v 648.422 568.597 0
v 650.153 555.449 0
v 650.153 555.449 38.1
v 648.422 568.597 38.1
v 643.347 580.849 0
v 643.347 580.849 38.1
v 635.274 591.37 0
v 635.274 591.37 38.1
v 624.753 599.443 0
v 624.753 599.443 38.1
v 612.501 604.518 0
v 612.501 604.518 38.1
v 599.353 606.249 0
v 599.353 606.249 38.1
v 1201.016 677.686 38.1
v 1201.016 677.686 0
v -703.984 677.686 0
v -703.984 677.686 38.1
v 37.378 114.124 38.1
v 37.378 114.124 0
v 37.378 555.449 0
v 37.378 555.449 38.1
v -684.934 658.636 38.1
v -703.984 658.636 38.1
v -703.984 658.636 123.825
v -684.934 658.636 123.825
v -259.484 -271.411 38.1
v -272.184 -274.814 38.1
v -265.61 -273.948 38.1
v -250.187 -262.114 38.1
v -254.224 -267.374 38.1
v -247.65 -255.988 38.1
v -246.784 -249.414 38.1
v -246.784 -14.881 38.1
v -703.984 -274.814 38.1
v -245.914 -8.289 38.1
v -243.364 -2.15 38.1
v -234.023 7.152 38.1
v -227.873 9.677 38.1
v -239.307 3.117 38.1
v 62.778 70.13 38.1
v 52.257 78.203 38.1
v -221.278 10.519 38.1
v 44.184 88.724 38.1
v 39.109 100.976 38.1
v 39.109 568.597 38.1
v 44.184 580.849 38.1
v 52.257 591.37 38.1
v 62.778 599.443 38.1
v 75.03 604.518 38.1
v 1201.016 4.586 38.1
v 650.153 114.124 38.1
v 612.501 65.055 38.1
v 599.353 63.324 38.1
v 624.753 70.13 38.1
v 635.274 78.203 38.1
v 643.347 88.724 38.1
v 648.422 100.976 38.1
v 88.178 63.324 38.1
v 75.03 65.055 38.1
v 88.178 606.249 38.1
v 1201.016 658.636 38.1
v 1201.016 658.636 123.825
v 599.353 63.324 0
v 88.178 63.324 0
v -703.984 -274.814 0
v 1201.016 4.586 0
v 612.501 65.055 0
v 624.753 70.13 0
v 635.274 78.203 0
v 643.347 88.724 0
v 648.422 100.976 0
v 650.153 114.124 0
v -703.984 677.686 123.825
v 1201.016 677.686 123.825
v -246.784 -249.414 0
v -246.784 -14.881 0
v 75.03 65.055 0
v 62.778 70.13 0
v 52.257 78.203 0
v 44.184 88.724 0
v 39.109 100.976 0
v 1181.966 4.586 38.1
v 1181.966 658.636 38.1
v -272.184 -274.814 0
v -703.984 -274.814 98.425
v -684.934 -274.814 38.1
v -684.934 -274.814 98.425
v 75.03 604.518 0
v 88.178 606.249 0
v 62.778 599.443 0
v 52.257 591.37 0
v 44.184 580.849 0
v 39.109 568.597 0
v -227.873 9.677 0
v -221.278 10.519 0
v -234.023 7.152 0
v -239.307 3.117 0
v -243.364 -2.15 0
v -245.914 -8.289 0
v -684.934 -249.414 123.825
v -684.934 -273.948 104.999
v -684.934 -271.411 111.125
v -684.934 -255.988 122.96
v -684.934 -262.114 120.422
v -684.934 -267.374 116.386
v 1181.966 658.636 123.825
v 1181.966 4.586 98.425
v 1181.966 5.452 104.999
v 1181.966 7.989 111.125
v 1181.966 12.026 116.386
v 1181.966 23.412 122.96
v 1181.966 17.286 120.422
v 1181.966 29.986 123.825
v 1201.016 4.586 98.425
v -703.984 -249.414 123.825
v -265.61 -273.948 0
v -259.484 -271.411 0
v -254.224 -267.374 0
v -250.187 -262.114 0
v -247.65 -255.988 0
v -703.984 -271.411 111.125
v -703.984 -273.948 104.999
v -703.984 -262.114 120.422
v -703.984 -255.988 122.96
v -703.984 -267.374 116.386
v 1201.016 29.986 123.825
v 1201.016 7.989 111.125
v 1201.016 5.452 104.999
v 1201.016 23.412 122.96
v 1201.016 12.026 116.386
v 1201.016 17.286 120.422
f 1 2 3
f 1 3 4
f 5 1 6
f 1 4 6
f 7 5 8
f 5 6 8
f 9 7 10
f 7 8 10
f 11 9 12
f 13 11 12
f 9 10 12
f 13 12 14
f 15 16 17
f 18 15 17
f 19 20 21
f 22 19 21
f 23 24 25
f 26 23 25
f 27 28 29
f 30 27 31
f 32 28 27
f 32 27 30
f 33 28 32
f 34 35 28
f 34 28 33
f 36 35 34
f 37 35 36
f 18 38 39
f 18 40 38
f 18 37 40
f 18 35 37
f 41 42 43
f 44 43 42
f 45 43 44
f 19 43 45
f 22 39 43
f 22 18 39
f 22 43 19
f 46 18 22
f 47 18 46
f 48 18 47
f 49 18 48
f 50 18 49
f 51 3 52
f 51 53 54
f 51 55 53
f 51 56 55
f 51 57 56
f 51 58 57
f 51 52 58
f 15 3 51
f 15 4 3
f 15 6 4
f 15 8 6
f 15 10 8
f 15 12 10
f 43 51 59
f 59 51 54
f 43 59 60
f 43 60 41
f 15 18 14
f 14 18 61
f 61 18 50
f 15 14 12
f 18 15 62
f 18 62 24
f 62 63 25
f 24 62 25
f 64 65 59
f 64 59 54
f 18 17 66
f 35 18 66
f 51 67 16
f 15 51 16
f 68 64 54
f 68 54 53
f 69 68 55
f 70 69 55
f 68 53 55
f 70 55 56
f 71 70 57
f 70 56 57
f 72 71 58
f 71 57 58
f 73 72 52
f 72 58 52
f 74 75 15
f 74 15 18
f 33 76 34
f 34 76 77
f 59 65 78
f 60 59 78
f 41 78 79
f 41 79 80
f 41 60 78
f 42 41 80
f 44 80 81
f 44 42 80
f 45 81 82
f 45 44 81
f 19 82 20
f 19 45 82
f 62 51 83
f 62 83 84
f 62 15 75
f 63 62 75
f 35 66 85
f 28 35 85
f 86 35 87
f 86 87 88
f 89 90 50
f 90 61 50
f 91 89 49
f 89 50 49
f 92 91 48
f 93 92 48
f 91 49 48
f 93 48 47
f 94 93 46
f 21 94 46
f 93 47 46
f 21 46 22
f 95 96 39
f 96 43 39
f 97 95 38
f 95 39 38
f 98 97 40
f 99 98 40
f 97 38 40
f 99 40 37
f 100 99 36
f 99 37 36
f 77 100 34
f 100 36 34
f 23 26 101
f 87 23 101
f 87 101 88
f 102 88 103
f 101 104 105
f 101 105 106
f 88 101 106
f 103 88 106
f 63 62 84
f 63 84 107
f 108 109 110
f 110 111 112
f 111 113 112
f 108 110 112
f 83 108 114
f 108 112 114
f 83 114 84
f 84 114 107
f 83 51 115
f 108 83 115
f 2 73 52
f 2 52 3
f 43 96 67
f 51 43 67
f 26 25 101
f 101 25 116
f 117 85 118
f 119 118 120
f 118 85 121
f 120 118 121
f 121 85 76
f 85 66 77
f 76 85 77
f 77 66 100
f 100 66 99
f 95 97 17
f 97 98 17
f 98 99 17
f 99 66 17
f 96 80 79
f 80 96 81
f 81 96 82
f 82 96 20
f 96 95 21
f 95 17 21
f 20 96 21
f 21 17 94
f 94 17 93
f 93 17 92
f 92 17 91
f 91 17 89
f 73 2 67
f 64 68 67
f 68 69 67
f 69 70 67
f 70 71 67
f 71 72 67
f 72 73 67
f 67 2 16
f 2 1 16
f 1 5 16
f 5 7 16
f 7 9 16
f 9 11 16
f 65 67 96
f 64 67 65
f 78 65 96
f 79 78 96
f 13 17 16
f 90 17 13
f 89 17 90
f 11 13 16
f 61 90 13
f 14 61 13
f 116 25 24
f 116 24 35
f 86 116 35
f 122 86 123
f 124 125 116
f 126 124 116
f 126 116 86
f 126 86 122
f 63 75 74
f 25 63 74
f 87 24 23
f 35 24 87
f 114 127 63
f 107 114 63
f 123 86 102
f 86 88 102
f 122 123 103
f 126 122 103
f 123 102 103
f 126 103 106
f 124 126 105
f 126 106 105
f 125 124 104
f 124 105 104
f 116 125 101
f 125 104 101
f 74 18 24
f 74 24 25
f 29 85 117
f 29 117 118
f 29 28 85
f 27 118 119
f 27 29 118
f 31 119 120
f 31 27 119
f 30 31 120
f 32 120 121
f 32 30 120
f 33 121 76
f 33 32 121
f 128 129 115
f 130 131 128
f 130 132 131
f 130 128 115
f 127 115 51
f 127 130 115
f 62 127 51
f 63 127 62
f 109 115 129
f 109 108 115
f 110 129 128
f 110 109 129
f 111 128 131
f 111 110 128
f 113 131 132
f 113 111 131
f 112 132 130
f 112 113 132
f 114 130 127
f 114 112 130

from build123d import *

# Parameters (mm, degrees)
F0_W      = 612.775
F0_H      = 542.925
F1_DEPTH  = 38.1
F3_W      = 933.45
F3_H      = 85.725
F4_DEPTH  = 19.05
F6_W      = 654.05
F6_H      = 85.725
F7_DEPTH  = 19.05
F9_W      = 1905
F9_H      = 85.725
F10_DEPTH = 19.05
F11_R     = 25.4
F11_2_R   = 25.4
F12_R     = 50.8
F13_R     = 25.4


with BuildPart() as f1:
    # F0 (on Top) → F1 (new body)
    with BuildSketch(Plane.XY):
        Polygon((1201.0157378892, 677.68615251), (-703.9842621108, 677.68615251), (-703.9842621108, -274.81384749), (-246.7842621108, -274.81384749), (-246.7842621108, 10.6256458031), (1201.0157378892, 4.58615251), align=None)
        with Locations((343.7657378892, 334.78615251)):
            Rectangle(F0_W, F0_H, mode=Mode.SUBTRACT)
    extrude(amount=F1_DEPTH)

    # F12
    f12_edges = [f1.edges().sort_by_distance(p)[0] for p in [
        (37.378238, 606.248653, 19.05),
        (650.153238, 606.248653, 19.05),
        (650.153238, 63.323653, 19.05),
        (37.378238, 63.323653, 19.05),
    ]]
    fillet(f12_edges, radius=F12_R)

    # F13
    f13_edges = [f1.edges().sort_by_distance(p)[0] for p in [
        (-246.784262, -274.813847, 19.05),
        (-246.784262, 10.625646, 19.05),
    ]]
    fillet(f13_edges, radius=F13_R)


with BuildPart() as f4:
    # F3 (on offset) → F4 (new body)
    with BuildSketch(Plane(origin=(-703.9842621108, 0, 0), x_dir=(0, -1, 0), z_dir=(-1, 0, 0))):
        with Locations((-191.91115251, 80.9625)):
            Rectangle(F3_W, F3_H)
    extrude(amount=-F4_DEPTH)

    # F11#2
    f11_2_edges = [f4.edges().sort_by_distance(p)[0] for p in [
        (-694.459262, -274.813847, 123.825),
    ]]
    fillet(f11_2_edges, radius=F11_2_R)


with BuildPart() as f7:
    # F6 (on offset) → F7 (new body)
    with BuildSketch(Plane.YZ.offset(1201.0157378892)):
        with Locations((331.61115251, 80.9625)):
            Rectangle(F6_W, F6_H)
    extrude(amount=-F7_DEPTH)

    # F11
    f11_edges = [f7.edges().sort_by_distance(p)[0] for p in [
        (1191.490738, 4.586153, 123.825),
    ]]
    fillet(f11_edges, radius=F11_R)


with BuildPart() as f10:
    # F9 (on offset) → F10 (new body)
    with BuildSketch(Plane(origin=(0, 677.68615251, 0), x_dir=(-1, 0, 0), z_dir=(0, 1, 0))):
        with Locations((-248.5157378892, 80.9625)):
            Rectangle(F9_W, F9_H)
    extrude(amount=-F10_DEPTH)


solid = Compound([f1.part, f4.part, f7.part, f10.part])
